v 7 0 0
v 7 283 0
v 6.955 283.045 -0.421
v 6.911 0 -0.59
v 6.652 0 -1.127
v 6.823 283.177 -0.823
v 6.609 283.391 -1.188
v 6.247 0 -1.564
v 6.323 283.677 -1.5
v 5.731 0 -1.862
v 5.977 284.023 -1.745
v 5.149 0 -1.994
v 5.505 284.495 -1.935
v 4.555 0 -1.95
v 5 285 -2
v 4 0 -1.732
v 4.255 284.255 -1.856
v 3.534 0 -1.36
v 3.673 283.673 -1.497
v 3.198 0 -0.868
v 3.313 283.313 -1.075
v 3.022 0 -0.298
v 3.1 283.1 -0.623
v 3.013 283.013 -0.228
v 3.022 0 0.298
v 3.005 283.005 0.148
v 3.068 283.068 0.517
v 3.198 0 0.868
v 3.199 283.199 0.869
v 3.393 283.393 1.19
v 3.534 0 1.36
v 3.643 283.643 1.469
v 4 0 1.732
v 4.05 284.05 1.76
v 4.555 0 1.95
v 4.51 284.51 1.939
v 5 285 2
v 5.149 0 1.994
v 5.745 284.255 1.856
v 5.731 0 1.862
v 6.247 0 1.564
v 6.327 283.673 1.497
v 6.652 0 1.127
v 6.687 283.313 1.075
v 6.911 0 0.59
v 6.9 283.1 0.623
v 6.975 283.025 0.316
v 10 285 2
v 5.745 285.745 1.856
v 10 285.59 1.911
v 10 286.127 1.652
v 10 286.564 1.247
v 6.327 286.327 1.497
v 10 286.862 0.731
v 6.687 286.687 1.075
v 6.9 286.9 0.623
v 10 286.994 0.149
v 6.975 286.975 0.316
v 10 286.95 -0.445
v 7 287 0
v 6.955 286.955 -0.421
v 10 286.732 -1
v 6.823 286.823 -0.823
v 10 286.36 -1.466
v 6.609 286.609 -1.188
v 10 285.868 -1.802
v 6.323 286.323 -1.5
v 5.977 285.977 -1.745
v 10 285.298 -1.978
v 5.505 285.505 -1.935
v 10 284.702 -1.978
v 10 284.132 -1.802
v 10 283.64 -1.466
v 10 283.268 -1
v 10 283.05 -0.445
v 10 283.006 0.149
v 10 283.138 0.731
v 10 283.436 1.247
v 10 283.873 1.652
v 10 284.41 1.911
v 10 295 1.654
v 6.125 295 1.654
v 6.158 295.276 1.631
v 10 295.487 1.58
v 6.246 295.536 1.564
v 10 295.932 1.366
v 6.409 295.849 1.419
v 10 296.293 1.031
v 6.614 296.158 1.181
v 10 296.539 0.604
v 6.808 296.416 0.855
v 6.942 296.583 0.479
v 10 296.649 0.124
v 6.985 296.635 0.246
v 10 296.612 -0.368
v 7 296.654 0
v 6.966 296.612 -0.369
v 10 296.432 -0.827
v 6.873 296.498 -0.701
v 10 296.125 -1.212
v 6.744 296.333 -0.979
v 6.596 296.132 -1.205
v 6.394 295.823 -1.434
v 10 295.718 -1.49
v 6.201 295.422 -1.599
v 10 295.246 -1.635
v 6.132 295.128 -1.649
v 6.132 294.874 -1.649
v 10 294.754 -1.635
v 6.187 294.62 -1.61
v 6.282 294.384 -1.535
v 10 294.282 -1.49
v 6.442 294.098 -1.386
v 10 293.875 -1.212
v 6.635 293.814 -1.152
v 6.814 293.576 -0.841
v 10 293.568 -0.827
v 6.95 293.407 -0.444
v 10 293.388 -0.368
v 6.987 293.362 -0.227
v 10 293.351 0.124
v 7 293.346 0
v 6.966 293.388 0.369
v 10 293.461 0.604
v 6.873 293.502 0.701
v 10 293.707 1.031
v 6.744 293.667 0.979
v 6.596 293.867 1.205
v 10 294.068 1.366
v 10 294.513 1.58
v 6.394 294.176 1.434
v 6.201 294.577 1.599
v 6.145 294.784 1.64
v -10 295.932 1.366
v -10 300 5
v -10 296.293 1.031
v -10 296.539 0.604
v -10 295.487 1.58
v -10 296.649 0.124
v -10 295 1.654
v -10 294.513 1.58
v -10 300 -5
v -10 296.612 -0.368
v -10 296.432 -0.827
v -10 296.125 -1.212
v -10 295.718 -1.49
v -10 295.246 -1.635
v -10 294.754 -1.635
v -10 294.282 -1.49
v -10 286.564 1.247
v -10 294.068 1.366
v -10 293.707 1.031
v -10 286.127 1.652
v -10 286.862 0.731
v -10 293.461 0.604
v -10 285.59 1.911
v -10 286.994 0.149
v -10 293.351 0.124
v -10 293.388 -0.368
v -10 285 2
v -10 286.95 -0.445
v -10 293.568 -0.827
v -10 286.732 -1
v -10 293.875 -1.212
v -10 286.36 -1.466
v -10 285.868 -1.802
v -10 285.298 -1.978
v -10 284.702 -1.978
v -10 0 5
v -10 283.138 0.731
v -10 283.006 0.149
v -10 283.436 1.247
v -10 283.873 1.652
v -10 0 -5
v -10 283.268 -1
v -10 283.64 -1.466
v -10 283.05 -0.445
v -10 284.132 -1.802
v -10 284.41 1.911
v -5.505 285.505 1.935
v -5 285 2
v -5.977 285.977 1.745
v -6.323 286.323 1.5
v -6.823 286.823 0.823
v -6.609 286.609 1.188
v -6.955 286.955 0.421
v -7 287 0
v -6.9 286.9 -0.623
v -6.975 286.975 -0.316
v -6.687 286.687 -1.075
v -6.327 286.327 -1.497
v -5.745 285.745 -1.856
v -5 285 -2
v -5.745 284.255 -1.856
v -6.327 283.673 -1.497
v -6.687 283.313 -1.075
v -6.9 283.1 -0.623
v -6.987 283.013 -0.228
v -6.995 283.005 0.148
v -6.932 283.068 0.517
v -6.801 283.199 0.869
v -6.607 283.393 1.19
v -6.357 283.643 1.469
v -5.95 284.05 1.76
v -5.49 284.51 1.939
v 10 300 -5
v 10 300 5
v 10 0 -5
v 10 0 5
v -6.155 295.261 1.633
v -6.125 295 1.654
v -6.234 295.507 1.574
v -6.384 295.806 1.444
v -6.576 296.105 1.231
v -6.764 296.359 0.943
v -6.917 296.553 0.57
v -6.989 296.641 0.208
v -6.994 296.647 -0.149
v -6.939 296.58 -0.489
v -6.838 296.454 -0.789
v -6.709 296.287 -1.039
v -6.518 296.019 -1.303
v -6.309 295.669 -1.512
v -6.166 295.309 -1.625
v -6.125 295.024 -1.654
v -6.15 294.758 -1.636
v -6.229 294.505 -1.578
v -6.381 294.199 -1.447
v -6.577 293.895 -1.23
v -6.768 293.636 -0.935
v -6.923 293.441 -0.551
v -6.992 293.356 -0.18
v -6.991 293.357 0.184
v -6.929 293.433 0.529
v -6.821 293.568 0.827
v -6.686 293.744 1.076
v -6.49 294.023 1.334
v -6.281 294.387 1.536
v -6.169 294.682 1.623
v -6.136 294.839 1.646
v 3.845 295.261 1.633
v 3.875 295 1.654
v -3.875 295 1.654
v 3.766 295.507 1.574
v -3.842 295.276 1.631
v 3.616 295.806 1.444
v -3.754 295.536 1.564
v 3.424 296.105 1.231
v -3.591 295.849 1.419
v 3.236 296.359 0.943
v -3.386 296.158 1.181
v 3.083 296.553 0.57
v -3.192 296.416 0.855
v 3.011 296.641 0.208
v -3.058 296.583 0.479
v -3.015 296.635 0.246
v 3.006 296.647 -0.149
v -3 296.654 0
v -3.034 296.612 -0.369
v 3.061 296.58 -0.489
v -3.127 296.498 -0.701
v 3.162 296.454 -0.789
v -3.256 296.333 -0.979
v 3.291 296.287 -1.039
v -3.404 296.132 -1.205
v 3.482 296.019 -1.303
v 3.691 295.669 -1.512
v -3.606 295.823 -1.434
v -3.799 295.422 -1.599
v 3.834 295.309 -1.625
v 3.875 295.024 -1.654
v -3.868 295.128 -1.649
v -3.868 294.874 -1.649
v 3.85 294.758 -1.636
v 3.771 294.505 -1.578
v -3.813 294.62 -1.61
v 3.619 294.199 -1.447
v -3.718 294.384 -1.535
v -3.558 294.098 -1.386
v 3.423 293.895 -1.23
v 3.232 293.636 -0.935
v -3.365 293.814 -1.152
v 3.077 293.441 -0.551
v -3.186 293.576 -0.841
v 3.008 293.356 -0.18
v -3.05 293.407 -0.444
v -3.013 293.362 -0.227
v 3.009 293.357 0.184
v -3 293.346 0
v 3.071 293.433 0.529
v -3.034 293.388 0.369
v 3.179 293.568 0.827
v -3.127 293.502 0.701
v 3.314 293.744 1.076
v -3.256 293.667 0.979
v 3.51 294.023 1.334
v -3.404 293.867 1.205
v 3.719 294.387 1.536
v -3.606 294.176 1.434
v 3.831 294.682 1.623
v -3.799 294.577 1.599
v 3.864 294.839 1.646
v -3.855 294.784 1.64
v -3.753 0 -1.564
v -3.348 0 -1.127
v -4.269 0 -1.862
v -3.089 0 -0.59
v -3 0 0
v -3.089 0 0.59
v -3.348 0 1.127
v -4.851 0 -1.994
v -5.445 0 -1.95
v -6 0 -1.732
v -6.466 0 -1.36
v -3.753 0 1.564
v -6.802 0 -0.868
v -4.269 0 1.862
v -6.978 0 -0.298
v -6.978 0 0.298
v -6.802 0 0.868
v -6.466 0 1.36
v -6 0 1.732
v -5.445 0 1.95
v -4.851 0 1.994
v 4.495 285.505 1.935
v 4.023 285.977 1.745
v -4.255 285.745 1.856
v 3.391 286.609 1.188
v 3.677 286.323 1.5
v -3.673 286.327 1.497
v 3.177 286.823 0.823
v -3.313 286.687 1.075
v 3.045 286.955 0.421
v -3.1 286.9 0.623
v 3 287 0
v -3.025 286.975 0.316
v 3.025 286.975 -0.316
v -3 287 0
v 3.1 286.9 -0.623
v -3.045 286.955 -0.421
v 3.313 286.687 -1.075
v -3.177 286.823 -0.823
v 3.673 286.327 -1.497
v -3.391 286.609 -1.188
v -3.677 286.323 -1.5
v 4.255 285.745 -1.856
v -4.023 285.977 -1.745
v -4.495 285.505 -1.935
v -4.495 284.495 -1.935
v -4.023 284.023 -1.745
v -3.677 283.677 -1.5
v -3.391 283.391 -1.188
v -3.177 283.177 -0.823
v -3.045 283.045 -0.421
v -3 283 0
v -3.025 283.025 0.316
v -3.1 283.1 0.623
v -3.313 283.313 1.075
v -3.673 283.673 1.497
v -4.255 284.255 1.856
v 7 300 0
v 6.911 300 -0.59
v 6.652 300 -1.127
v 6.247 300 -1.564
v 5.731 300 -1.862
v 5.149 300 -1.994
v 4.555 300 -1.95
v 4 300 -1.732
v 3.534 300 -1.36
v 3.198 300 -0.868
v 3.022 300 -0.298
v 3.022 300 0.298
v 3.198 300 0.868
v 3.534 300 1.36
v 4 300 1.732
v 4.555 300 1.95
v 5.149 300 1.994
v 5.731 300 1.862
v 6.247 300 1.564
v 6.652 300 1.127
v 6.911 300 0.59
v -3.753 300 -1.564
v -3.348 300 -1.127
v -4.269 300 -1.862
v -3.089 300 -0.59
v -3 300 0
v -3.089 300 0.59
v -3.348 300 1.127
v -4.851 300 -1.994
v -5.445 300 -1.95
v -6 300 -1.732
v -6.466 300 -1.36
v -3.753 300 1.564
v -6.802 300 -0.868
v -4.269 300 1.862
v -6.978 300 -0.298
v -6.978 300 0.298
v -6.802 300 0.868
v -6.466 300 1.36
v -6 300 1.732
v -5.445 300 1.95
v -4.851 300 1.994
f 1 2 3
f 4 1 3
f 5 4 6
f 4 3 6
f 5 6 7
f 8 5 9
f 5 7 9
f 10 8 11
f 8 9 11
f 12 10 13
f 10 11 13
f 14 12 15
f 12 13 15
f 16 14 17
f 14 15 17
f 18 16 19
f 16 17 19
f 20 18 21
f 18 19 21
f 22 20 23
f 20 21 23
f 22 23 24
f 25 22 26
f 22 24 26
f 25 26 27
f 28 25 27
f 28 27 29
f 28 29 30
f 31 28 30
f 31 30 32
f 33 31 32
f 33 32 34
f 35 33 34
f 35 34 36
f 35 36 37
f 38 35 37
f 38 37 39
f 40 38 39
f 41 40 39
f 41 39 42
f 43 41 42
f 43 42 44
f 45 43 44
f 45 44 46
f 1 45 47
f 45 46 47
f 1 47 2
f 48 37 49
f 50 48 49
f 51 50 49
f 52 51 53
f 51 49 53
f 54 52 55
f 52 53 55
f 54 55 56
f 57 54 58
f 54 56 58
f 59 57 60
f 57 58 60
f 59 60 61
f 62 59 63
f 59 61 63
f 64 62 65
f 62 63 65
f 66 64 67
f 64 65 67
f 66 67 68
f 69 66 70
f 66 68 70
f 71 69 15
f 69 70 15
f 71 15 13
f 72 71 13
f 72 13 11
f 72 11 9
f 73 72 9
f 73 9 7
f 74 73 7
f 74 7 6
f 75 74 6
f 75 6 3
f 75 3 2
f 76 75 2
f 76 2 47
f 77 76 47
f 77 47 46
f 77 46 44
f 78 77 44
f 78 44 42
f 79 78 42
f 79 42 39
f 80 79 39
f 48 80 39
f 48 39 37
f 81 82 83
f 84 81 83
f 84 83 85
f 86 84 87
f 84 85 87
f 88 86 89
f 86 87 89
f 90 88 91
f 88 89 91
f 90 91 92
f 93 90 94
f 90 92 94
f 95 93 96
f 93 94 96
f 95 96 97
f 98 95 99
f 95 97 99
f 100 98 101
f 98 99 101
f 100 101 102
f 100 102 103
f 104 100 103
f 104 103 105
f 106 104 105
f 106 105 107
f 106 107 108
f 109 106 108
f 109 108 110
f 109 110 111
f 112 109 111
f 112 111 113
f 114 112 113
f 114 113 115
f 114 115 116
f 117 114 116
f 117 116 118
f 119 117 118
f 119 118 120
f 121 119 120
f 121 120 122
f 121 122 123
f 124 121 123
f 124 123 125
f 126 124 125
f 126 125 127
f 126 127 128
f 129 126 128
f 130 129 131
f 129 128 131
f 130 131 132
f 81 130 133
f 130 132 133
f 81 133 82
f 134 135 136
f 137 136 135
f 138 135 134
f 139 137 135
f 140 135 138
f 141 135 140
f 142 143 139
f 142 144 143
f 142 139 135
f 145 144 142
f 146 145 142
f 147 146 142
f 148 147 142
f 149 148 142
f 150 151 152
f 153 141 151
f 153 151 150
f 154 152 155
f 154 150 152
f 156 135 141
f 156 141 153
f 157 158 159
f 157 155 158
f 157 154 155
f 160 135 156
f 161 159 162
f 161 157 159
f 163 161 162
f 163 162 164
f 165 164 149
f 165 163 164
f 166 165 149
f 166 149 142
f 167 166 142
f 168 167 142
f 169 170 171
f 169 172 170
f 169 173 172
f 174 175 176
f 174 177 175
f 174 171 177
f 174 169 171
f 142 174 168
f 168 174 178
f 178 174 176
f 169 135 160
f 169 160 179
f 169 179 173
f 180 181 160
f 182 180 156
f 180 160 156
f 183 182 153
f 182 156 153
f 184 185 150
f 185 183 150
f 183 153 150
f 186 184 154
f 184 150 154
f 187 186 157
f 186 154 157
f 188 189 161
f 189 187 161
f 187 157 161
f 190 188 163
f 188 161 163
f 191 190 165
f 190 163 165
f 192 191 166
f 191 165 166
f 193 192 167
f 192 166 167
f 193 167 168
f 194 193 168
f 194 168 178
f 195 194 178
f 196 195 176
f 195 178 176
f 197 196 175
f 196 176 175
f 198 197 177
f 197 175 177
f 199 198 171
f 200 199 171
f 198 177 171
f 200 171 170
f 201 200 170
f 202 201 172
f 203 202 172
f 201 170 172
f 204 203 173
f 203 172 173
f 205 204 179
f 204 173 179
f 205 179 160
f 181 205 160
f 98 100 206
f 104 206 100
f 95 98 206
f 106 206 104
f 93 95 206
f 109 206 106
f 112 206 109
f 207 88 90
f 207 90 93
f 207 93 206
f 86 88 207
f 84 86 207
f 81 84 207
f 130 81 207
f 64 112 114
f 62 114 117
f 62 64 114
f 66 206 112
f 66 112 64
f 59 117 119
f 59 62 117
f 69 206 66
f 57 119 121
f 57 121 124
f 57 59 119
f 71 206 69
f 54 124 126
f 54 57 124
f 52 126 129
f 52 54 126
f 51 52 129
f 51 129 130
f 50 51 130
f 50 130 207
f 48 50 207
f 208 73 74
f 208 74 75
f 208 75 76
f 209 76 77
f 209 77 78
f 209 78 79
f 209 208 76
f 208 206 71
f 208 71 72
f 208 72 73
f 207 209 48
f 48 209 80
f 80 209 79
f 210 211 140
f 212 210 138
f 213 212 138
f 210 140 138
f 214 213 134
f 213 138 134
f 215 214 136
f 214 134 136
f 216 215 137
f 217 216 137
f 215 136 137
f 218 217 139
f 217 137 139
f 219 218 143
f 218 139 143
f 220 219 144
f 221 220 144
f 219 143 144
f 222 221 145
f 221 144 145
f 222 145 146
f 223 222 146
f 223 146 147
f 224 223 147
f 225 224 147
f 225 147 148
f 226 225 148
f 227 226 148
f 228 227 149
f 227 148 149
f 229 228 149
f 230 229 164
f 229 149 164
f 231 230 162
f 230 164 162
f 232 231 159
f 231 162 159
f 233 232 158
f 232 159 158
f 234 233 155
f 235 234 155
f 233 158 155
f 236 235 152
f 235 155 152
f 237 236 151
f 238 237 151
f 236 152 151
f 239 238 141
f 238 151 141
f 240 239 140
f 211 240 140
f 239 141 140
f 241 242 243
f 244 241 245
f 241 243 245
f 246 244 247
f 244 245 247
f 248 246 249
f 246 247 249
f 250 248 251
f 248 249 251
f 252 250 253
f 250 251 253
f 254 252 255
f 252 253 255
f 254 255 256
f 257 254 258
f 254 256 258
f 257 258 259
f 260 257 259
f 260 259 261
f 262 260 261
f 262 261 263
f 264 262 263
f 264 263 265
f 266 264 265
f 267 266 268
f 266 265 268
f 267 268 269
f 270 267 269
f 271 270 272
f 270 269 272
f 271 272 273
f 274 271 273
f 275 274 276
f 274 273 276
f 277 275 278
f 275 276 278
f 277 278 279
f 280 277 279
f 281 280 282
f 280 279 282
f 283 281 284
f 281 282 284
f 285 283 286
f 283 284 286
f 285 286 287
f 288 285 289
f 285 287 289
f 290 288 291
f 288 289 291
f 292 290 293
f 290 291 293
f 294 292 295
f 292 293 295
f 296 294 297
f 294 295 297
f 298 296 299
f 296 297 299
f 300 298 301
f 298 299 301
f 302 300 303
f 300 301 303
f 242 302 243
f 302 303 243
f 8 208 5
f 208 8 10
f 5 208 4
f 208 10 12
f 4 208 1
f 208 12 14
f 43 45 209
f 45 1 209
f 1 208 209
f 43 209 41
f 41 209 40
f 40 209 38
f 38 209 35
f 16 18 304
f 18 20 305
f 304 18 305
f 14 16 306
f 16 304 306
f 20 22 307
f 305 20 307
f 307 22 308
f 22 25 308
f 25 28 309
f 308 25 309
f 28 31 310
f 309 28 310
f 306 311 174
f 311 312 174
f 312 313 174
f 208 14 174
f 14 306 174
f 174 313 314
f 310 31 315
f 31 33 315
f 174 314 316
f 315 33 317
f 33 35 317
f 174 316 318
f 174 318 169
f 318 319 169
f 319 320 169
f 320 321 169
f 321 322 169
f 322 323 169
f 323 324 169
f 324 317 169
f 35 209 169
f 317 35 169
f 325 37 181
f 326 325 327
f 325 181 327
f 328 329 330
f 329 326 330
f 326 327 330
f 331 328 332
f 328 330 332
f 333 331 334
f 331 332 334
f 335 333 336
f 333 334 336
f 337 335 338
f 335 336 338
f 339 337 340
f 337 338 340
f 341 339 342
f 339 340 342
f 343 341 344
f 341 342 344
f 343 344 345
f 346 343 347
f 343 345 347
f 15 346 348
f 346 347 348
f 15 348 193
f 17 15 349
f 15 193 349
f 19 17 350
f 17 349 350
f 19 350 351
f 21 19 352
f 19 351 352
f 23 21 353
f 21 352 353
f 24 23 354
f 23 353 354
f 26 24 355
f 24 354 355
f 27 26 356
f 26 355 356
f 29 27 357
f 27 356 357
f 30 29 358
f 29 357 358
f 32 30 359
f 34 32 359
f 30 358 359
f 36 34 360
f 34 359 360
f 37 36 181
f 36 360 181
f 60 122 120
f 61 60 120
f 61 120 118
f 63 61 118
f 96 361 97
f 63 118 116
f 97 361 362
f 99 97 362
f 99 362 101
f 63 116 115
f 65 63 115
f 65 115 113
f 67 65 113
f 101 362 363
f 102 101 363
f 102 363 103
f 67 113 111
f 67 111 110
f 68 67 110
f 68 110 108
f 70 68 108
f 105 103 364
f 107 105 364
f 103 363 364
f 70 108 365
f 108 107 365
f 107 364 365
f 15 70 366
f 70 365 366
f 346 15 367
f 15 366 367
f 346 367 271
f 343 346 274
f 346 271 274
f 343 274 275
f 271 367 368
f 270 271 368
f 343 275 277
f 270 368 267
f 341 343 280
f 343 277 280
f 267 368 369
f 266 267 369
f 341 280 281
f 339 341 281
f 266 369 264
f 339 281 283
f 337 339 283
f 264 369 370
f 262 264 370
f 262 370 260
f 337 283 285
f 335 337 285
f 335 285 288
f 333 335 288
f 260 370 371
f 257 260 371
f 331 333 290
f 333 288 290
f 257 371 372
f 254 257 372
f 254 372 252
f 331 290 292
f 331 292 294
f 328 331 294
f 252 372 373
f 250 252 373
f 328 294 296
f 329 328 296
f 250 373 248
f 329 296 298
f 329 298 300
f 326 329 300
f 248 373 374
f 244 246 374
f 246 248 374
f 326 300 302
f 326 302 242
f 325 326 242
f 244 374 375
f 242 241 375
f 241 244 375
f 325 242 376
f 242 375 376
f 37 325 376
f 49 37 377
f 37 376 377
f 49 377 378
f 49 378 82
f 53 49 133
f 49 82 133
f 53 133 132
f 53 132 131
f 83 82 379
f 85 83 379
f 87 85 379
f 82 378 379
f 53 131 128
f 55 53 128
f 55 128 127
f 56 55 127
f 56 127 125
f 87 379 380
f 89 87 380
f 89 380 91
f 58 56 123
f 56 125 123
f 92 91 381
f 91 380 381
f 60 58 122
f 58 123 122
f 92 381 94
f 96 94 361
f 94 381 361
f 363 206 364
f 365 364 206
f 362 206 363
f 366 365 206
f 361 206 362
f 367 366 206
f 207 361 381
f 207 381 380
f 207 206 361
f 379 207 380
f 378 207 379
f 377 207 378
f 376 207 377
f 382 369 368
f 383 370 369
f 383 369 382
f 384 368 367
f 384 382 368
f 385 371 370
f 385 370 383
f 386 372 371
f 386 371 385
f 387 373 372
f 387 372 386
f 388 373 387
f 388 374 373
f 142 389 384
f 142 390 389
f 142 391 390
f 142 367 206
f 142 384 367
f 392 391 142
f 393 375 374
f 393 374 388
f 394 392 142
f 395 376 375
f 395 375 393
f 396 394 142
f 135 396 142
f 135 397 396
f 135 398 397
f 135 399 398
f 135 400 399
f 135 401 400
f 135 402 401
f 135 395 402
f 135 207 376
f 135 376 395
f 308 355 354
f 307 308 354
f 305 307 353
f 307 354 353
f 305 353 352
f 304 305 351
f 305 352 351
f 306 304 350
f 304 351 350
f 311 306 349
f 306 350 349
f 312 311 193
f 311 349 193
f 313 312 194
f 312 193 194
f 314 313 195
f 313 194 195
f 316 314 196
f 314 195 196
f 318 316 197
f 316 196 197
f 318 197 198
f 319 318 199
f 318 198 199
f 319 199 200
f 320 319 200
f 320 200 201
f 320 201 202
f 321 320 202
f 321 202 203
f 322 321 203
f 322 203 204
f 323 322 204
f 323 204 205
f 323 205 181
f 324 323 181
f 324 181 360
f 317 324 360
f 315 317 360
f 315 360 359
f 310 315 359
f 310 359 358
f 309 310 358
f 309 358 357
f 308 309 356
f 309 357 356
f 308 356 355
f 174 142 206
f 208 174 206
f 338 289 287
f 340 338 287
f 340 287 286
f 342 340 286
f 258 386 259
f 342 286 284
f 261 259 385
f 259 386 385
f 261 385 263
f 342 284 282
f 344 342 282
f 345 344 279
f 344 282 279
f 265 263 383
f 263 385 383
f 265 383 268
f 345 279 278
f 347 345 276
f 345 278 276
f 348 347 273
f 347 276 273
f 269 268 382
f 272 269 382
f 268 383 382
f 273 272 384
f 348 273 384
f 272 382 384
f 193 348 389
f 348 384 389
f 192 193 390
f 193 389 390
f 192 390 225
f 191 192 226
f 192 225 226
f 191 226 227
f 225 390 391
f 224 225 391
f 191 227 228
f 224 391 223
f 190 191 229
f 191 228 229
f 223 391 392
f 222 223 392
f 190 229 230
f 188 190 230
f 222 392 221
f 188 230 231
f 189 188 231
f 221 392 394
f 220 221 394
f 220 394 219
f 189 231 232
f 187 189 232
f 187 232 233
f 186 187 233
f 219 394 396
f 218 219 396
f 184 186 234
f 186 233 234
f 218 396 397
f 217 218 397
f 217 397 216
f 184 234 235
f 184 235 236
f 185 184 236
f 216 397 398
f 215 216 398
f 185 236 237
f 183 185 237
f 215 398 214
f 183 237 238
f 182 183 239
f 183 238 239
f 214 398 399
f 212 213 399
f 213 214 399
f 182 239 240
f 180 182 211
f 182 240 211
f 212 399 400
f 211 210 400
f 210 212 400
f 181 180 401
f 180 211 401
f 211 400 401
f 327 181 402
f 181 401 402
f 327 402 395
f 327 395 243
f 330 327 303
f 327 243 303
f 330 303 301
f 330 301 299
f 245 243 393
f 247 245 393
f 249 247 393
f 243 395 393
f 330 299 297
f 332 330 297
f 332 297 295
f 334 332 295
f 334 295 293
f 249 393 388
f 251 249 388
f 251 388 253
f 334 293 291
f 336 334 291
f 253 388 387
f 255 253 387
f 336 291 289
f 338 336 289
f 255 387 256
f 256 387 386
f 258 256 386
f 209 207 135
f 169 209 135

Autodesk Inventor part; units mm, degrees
ref_plane "YZ Plane" through (0, 0, 0) normal (1, 0, 0) x (0, 1, 0)
ref_plane "XZ Plane" through (0, 0, 0) normal (0, 1, 0) x (-1, 0, 0)
ref_plane "XY Plane" through (0, 0, 0) normal (0, 0, 1) x (1, 0, 0)
sketch "Sketch1" plane through (0, 0, 0) normal (0, 1, 0) x (-1, 0, 0)
  line L0 (-10, 5) -> (10, 5)
  line L1 (10, 5) -> (10, -5)
  line L2 (10, -5) -> (-10, -5)
  line L3 (-10, -5) -> (-10, 5)
  line L4 (-10, 5) -> (10, -5) construction
  line L5 (10, 5) -> (-10, -5) construction
  point P0 (0, 0)
  dimension "d0" = 20
  dimension "d1" = 10
extrude "Extrusion1" add sketch "Sketch1" along normal blind 300
sketch "Sketch2" plane through (0, 300, 0) normal (0, 1, 0) x (1, 0, 0)
  line L0 (0, 0) -> (0, 3.3139) construction
  line L1 (10, 5) -> (-10, 5) projected
  circle A0 centre (-5, 0) radius 2
  circle A1 centre (5, 0) radius 2
  line L2 (0, 0) -> (-5, 0)
  line L3 (0, 0) -> (5, 0)
  dimension "d4" = 4
  dimension "d7" = 5
  dimension "d8" = 5
extrude "Extrusion2" cut sketch "Sketch2" against normal blind 300
sketch "Sketch3" plane through (-10, 0, -5) normal (-1, 0, 0) x (0, 0, 1)
  line L0 (0, 300) -> (10, 300) projected
  line L1 (5, 300) -> (5, 295) construction
  line L2 (5, 295) -> (5, 285) construction
  circle A0 centre (5, 295) radius 1.6538
  circle A1 centre (5, 285) radius 2
  point P0 (5, 0)
  dimension "d9" = 5
  dimension "d10" = 10
  dimension "d11" = 4
extrude "Extrusion3" cut sketch "Sketch3" against normal blind 32.225
properties part number "spine"
